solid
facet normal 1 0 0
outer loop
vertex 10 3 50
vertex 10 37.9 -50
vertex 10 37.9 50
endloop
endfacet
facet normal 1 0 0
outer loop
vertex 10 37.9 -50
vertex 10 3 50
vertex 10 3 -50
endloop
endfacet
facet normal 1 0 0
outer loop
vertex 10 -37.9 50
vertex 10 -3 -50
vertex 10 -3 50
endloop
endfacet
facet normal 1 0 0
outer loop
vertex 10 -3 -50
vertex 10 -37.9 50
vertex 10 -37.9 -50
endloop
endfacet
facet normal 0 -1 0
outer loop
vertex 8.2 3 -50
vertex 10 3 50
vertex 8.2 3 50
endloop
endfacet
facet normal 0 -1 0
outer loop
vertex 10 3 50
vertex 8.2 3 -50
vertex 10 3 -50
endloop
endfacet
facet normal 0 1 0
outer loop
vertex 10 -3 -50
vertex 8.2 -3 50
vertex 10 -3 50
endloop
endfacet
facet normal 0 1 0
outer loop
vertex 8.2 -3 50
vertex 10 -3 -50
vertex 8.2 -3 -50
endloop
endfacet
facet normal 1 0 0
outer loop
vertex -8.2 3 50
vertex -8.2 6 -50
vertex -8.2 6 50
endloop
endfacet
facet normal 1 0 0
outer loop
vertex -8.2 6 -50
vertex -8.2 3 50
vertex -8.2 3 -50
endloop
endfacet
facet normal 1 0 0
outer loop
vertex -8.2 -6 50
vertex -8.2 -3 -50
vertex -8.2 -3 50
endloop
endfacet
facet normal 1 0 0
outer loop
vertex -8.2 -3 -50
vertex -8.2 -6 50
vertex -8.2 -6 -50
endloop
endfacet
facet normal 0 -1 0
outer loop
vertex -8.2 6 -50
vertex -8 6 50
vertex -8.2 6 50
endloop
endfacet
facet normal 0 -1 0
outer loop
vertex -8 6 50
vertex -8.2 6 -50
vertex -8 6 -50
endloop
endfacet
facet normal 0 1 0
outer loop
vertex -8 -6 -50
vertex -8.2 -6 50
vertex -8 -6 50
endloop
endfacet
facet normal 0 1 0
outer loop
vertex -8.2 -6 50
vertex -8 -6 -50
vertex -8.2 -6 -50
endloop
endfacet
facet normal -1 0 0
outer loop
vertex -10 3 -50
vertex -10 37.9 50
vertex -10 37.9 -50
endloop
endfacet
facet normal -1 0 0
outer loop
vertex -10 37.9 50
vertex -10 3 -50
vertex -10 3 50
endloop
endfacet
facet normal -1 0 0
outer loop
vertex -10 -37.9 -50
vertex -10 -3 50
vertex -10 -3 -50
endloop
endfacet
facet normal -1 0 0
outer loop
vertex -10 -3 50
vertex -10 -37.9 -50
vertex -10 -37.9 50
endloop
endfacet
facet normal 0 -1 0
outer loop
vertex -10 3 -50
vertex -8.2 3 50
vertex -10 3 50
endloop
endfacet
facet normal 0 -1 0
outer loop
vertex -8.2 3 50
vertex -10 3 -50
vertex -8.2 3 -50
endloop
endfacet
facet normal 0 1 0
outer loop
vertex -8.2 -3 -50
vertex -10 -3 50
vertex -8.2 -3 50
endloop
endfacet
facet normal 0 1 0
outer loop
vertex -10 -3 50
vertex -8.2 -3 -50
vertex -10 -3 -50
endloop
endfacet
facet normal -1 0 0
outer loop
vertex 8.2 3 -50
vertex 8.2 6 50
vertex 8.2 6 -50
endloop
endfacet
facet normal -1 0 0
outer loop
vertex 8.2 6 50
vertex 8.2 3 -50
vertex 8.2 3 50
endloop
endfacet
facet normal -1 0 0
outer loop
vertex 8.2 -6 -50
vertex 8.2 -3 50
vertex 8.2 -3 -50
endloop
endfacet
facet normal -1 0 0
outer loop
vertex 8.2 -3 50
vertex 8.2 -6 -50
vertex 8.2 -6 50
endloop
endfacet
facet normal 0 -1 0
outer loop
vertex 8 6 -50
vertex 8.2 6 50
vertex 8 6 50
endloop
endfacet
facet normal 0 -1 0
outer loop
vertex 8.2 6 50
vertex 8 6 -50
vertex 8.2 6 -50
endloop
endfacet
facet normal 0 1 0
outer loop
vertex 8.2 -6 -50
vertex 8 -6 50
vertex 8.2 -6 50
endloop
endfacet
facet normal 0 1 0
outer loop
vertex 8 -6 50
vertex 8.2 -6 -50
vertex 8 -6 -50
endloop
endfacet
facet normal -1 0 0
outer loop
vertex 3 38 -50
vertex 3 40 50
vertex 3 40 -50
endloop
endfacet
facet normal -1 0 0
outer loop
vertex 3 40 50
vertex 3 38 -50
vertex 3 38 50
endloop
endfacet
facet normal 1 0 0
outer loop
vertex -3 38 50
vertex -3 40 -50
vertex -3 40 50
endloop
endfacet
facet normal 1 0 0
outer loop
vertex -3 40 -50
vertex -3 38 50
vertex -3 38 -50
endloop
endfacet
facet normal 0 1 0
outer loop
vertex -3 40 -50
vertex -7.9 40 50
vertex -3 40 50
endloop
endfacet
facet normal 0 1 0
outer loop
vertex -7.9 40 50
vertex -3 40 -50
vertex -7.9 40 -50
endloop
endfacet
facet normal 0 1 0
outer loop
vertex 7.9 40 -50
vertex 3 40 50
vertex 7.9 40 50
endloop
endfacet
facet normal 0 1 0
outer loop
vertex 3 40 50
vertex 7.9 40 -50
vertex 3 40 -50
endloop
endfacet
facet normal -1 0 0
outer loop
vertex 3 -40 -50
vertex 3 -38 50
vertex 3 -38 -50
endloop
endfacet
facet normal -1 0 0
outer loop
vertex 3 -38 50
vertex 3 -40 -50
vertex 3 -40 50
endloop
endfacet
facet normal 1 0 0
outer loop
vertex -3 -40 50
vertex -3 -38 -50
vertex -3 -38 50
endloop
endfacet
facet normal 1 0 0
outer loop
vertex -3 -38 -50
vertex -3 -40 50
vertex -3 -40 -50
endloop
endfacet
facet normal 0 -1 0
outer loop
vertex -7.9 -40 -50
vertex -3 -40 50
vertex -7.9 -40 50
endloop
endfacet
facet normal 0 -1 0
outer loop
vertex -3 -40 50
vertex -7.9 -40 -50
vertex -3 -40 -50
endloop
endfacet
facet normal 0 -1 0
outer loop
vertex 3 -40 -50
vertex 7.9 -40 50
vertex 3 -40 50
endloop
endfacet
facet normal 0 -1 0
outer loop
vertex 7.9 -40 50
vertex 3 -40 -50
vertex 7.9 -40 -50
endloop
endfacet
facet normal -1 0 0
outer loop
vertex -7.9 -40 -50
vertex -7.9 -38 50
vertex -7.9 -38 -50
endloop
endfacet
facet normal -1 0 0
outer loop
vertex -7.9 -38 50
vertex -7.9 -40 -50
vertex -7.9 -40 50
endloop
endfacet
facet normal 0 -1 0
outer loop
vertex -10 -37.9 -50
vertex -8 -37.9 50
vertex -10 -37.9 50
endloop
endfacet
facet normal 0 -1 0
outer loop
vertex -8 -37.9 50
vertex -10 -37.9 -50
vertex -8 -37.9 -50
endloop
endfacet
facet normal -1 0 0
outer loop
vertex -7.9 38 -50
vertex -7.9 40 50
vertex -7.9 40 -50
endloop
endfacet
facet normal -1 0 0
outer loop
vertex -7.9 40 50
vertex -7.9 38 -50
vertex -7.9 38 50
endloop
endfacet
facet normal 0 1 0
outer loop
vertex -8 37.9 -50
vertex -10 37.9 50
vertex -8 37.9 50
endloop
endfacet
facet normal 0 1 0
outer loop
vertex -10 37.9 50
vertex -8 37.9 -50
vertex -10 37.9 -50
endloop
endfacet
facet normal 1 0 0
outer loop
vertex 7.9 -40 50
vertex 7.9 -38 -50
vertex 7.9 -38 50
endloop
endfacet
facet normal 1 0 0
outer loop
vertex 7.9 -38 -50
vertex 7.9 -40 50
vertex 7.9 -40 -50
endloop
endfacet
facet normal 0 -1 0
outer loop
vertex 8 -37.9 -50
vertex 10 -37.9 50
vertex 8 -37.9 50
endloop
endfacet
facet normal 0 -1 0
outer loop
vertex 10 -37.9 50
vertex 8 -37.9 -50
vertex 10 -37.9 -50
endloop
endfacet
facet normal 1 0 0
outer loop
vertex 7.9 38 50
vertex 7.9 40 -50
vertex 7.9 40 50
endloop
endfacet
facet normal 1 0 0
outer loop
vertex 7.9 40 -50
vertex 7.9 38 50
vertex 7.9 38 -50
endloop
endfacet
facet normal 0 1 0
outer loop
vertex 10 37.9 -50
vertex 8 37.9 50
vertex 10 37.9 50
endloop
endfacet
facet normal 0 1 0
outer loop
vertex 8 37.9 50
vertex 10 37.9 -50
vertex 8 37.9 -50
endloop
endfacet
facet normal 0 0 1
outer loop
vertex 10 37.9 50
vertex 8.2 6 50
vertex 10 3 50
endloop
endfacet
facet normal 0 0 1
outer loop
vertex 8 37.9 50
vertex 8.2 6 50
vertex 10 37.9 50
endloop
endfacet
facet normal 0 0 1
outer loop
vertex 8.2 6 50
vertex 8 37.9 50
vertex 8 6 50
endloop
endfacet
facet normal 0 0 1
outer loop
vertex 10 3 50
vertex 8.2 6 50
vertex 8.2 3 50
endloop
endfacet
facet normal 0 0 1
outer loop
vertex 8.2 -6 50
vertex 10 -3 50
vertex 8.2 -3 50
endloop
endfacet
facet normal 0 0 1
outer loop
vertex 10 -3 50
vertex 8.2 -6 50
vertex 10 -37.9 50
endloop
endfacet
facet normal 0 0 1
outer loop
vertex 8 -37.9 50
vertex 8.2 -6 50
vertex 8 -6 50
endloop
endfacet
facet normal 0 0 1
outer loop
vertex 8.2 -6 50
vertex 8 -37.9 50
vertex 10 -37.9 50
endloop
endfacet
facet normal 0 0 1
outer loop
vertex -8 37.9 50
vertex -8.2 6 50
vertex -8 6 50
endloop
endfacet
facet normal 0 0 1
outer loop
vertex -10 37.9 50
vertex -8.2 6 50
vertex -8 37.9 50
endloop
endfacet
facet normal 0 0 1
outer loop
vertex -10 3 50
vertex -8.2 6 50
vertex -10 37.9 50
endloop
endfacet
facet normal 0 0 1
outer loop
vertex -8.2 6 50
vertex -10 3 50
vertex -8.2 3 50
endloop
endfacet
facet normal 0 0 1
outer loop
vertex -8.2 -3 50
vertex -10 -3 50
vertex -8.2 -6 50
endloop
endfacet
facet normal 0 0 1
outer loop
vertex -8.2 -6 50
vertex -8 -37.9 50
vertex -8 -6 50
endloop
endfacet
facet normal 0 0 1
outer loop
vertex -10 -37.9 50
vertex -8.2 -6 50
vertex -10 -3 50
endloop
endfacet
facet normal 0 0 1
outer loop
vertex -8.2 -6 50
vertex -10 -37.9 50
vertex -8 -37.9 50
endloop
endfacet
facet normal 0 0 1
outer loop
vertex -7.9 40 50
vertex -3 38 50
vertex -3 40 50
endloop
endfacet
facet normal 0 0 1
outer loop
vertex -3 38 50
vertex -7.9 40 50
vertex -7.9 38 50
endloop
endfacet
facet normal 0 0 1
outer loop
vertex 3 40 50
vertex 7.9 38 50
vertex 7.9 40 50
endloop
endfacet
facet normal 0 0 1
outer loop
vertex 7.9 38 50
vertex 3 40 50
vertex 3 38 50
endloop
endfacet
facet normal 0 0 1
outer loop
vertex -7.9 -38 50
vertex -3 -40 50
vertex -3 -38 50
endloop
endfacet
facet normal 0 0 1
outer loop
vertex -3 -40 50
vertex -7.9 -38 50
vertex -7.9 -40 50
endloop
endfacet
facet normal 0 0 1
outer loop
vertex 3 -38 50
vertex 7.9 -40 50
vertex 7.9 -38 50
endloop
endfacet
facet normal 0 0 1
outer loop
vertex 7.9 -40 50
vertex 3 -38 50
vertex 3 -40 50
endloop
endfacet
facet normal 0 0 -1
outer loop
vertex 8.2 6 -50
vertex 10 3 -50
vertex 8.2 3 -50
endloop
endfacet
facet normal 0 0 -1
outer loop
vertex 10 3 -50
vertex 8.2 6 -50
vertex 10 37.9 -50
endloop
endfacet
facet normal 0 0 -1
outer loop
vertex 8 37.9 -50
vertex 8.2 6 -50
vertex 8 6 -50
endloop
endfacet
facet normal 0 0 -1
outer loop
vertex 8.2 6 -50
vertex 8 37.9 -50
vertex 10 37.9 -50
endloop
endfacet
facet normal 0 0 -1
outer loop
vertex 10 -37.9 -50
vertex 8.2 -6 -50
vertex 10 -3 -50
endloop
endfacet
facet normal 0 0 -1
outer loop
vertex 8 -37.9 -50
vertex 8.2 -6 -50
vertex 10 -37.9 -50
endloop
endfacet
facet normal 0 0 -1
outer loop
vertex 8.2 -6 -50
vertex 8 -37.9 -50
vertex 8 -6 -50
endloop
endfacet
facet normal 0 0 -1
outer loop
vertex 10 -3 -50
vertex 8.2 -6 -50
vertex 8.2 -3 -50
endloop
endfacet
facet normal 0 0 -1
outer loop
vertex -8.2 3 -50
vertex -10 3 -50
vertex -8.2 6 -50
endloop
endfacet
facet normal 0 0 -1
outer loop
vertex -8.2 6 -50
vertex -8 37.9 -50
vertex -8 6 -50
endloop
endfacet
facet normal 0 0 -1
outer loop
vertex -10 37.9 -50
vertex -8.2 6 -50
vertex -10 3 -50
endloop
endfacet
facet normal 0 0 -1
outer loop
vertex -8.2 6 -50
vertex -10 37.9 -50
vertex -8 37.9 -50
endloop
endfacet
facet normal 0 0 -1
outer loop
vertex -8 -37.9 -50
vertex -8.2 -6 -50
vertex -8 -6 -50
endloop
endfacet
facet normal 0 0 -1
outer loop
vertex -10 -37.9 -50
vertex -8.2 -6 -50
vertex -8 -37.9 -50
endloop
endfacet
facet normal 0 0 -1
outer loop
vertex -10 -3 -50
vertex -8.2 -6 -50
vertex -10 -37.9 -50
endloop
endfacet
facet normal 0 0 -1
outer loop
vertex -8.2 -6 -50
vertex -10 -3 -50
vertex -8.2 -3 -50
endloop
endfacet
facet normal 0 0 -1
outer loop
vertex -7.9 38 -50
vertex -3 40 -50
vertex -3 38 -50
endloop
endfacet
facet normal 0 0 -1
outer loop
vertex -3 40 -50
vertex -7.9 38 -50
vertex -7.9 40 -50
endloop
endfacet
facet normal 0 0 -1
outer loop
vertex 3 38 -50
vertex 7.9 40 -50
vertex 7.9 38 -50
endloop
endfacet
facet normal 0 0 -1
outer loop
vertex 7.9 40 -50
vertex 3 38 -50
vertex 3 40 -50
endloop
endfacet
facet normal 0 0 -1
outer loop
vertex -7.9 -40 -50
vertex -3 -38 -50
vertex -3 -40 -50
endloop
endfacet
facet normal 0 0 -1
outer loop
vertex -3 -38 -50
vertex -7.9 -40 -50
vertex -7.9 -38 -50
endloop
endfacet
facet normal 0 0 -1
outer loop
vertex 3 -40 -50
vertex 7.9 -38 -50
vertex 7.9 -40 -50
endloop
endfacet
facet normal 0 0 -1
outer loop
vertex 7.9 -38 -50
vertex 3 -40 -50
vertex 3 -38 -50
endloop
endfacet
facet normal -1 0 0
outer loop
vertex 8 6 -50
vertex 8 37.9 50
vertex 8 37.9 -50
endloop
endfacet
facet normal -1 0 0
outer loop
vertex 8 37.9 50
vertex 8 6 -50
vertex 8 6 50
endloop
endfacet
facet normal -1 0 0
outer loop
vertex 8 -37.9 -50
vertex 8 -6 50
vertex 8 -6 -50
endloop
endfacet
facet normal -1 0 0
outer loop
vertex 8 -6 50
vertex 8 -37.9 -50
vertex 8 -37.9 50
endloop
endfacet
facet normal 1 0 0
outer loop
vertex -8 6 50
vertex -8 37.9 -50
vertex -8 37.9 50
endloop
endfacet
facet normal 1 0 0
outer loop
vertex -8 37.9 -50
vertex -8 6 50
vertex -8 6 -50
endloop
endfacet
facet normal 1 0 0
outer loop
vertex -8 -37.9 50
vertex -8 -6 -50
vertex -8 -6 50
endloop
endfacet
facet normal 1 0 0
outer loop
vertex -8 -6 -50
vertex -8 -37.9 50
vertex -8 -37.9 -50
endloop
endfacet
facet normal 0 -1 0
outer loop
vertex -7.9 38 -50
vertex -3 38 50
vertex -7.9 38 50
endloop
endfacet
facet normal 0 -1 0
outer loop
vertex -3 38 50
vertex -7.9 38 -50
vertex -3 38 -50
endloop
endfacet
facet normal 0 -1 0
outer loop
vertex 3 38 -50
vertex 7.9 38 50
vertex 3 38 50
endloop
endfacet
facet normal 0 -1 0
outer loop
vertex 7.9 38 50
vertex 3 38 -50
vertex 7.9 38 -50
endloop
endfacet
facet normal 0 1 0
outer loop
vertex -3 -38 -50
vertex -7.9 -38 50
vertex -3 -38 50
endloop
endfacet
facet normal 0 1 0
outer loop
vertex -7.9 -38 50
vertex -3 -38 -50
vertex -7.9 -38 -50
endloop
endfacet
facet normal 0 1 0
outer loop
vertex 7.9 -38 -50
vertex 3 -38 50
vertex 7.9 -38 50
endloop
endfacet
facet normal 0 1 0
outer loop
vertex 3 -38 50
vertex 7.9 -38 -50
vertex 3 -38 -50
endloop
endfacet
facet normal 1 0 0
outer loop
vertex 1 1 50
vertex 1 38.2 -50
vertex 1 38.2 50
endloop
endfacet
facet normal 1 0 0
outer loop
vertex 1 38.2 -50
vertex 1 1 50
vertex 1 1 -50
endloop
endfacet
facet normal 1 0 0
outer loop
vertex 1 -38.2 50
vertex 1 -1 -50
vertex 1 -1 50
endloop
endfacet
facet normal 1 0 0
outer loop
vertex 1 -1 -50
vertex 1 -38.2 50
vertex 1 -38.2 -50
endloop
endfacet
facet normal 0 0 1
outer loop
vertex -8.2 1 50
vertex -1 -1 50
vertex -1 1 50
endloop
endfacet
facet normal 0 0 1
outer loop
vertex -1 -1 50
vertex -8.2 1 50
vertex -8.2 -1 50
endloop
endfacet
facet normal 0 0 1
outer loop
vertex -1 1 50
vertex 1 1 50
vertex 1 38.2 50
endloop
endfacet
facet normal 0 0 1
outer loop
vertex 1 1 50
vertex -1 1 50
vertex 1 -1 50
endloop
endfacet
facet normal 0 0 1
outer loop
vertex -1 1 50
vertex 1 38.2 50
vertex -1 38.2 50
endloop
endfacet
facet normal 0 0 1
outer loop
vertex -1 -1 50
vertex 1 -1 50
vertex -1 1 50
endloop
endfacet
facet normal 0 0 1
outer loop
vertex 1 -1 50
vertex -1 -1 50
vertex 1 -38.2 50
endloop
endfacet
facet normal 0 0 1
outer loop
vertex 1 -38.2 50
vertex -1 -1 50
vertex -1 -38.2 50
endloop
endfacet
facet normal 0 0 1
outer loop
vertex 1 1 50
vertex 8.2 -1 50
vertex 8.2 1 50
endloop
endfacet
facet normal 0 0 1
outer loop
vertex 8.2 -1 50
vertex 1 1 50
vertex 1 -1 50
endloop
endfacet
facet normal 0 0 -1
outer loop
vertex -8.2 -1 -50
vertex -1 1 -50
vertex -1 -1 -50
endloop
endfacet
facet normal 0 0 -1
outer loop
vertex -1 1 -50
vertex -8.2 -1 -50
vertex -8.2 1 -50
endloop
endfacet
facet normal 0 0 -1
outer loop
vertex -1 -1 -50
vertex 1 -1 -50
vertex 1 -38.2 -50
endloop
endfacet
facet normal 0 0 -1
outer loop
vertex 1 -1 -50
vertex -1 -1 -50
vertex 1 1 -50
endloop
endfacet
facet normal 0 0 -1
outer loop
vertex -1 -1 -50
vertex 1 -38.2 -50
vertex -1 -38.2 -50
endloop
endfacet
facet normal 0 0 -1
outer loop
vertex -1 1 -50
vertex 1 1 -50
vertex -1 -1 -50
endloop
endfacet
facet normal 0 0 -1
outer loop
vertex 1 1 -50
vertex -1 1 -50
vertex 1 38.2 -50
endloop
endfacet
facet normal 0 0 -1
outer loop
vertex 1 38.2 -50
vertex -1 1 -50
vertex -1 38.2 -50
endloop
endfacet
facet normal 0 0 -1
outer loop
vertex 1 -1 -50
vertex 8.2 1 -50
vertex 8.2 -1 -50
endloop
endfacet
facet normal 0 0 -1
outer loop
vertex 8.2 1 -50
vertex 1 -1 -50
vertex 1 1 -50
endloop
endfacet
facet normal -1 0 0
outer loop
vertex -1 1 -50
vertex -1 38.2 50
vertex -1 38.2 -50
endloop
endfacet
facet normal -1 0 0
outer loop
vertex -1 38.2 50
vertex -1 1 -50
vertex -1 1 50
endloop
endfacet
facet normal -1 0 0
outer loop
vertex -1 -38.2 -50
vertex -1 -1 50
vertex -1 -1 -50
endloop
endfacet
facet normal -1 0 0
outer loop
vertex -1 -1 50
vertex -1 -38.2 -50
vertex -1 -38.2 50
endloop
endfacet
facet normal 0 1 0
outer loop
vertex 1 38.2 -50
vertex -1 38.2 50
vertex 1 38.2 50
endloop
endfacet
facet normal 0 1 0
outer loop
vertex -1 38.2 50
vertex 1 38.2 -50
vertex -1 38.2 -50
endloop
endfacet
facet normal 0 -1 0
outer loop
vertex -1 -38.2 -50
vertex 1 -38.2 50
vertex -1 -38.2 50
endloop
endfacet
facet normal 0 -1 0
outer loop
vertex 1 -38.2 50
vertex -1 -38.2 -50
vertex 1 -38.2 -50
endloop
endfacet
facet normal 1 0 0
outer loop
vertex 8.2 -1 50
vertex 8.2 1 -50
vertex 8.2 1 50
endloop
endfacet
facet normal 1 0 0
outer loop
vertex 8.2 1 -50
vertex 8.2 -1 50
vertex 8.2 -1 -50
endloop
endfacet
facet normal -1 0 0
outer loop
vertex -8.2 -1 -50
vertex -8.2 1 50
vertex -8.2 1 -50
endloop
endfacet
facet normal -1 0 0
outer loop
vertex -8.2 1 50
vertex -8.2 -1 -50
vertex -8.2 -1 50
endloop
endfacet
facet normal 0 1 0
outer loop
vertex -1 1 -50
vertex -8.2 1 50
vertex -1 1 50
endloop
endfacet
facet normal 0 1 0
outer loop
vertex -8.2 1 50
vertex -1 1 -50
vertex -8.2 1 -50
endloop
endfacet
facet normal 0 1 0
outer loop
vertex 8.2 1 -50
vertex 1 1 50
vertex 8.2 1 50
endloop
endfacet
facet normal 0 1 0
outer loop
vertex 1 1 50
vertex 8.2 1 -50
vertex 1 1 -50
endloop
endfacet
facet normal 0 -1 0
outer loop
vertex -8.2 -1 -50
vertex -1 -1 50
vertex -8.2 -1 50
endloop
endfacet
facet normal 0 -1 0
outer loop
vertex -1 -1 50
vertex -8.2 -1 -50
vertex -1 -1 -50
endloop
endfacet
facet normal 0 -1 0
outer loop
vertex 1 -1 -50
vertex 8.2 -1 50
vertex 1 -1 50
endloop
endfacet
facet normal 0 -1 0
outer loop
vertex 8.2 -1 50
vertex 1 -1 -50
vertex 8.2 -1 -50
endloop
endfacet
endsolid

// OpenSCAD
// 20x80 aluminium T-slot extrusion (simplified but recognizable), 100mm long
// ONE connected solid. Cross-section: 20mm (X) x 80mm (Y). Length: 100mm (Z).

$fn = 64;

// Requested size
w = 20.0;     // X (mm)
h = 80.0;     // Y (mm)
L = 100.0;    // Z (mm)

// Feature sizes (kept conservative to avoid cutting through)
wall = 2.0;          // outer wall thickness
slot_open = 6.0;     // slot mouth width
slot_depth = 6.0;    // depth from outer face
slot_cavity = 12.0;  // wider cavity behind mouth
web = 2.0;           // internal cross web thickness
center_bore_d = 6.0; // center bore diameter
over = 0.2;          // boolean overlap

module tslot_cut_from_posX(len) {
    // Cut a T-slot from +X face inward (along -X)
    union() {
        // Mouth
        translate([ w/2 - (slot_depth + over)/2, 0, 0 ])
            cube([slot_depth + over, slot_open, len + 2*over], center=true);

        // Inner cavity (starts after mouth)
        translate([ w/2 - slot_depth - (slot_cavity + over)/2, 0, 0 ])
            cube([slot_cavity + over, slot_cavity, len + 2*over], center=true);
    }
}

module tslot_cut_from_posY(len) {
    // Cut a T-slot from +Y face inward (along -Y)
    union() {
        // Mouth
        translate([ 0, h/2 - (slot_depth + over)/2, 0 ])
            cube([slot_open, slot_depth + over, len + 2*over], center=true);

        // Inner cavity
        translate([ 0, h/2 - slot_depth - (slot_cavity + over)/2, 0 ])
            cube([slot_cavity, slot_cavity + over, len + 2*over], center=true);
    }
}

module extrusion_20x80(len=L) {
    // Build as: (outer - voids) + webs, all in one union => one connected solid
    union() {
        // Outer shell with internal voids and slots removed
        difference() {
            // Outer body
            cube([w, h, len], center=true);

            // Main internal void (keeps outer walls)
            cube([w - 2*wall, h - 2*wall, len + 2*over], center=true);

            // Center bore
            cylinder(d=center_bore_d, h=len + 2*over, center=true);

            // T-slots on all four faces
            tslot_cut_from_posX(len);
            mirror([1,0,0]) tslot_cut_from_posX(len);
            tslot_cut_from_posY(len);
            mirror([0,1,0]) tslot_cut_from_posY(len);

            // Small corner relief pockets (shallow, do not disconnect)
            for (sx = [-1, 1], sy = [-1, 1]) {
                translate([ sx*(w/2 - wall/2), sy*(h/2 - wall/2), 0 ])
                    cube([wall + over, wall + over, len + 2*over], center=true);
            }
        }

        // Internal webs added back (ensure connectedness and typical look)
        // Slightly overlap into remaining material to avoid coincident faces.
        cube([web, h - 2*wall + 2*over, len], center=true); // vertical web
        cube([w - 2*wall + 2*over, web, len], center=true); // horizontal web
    }
}

extrusion_20x80(L);
